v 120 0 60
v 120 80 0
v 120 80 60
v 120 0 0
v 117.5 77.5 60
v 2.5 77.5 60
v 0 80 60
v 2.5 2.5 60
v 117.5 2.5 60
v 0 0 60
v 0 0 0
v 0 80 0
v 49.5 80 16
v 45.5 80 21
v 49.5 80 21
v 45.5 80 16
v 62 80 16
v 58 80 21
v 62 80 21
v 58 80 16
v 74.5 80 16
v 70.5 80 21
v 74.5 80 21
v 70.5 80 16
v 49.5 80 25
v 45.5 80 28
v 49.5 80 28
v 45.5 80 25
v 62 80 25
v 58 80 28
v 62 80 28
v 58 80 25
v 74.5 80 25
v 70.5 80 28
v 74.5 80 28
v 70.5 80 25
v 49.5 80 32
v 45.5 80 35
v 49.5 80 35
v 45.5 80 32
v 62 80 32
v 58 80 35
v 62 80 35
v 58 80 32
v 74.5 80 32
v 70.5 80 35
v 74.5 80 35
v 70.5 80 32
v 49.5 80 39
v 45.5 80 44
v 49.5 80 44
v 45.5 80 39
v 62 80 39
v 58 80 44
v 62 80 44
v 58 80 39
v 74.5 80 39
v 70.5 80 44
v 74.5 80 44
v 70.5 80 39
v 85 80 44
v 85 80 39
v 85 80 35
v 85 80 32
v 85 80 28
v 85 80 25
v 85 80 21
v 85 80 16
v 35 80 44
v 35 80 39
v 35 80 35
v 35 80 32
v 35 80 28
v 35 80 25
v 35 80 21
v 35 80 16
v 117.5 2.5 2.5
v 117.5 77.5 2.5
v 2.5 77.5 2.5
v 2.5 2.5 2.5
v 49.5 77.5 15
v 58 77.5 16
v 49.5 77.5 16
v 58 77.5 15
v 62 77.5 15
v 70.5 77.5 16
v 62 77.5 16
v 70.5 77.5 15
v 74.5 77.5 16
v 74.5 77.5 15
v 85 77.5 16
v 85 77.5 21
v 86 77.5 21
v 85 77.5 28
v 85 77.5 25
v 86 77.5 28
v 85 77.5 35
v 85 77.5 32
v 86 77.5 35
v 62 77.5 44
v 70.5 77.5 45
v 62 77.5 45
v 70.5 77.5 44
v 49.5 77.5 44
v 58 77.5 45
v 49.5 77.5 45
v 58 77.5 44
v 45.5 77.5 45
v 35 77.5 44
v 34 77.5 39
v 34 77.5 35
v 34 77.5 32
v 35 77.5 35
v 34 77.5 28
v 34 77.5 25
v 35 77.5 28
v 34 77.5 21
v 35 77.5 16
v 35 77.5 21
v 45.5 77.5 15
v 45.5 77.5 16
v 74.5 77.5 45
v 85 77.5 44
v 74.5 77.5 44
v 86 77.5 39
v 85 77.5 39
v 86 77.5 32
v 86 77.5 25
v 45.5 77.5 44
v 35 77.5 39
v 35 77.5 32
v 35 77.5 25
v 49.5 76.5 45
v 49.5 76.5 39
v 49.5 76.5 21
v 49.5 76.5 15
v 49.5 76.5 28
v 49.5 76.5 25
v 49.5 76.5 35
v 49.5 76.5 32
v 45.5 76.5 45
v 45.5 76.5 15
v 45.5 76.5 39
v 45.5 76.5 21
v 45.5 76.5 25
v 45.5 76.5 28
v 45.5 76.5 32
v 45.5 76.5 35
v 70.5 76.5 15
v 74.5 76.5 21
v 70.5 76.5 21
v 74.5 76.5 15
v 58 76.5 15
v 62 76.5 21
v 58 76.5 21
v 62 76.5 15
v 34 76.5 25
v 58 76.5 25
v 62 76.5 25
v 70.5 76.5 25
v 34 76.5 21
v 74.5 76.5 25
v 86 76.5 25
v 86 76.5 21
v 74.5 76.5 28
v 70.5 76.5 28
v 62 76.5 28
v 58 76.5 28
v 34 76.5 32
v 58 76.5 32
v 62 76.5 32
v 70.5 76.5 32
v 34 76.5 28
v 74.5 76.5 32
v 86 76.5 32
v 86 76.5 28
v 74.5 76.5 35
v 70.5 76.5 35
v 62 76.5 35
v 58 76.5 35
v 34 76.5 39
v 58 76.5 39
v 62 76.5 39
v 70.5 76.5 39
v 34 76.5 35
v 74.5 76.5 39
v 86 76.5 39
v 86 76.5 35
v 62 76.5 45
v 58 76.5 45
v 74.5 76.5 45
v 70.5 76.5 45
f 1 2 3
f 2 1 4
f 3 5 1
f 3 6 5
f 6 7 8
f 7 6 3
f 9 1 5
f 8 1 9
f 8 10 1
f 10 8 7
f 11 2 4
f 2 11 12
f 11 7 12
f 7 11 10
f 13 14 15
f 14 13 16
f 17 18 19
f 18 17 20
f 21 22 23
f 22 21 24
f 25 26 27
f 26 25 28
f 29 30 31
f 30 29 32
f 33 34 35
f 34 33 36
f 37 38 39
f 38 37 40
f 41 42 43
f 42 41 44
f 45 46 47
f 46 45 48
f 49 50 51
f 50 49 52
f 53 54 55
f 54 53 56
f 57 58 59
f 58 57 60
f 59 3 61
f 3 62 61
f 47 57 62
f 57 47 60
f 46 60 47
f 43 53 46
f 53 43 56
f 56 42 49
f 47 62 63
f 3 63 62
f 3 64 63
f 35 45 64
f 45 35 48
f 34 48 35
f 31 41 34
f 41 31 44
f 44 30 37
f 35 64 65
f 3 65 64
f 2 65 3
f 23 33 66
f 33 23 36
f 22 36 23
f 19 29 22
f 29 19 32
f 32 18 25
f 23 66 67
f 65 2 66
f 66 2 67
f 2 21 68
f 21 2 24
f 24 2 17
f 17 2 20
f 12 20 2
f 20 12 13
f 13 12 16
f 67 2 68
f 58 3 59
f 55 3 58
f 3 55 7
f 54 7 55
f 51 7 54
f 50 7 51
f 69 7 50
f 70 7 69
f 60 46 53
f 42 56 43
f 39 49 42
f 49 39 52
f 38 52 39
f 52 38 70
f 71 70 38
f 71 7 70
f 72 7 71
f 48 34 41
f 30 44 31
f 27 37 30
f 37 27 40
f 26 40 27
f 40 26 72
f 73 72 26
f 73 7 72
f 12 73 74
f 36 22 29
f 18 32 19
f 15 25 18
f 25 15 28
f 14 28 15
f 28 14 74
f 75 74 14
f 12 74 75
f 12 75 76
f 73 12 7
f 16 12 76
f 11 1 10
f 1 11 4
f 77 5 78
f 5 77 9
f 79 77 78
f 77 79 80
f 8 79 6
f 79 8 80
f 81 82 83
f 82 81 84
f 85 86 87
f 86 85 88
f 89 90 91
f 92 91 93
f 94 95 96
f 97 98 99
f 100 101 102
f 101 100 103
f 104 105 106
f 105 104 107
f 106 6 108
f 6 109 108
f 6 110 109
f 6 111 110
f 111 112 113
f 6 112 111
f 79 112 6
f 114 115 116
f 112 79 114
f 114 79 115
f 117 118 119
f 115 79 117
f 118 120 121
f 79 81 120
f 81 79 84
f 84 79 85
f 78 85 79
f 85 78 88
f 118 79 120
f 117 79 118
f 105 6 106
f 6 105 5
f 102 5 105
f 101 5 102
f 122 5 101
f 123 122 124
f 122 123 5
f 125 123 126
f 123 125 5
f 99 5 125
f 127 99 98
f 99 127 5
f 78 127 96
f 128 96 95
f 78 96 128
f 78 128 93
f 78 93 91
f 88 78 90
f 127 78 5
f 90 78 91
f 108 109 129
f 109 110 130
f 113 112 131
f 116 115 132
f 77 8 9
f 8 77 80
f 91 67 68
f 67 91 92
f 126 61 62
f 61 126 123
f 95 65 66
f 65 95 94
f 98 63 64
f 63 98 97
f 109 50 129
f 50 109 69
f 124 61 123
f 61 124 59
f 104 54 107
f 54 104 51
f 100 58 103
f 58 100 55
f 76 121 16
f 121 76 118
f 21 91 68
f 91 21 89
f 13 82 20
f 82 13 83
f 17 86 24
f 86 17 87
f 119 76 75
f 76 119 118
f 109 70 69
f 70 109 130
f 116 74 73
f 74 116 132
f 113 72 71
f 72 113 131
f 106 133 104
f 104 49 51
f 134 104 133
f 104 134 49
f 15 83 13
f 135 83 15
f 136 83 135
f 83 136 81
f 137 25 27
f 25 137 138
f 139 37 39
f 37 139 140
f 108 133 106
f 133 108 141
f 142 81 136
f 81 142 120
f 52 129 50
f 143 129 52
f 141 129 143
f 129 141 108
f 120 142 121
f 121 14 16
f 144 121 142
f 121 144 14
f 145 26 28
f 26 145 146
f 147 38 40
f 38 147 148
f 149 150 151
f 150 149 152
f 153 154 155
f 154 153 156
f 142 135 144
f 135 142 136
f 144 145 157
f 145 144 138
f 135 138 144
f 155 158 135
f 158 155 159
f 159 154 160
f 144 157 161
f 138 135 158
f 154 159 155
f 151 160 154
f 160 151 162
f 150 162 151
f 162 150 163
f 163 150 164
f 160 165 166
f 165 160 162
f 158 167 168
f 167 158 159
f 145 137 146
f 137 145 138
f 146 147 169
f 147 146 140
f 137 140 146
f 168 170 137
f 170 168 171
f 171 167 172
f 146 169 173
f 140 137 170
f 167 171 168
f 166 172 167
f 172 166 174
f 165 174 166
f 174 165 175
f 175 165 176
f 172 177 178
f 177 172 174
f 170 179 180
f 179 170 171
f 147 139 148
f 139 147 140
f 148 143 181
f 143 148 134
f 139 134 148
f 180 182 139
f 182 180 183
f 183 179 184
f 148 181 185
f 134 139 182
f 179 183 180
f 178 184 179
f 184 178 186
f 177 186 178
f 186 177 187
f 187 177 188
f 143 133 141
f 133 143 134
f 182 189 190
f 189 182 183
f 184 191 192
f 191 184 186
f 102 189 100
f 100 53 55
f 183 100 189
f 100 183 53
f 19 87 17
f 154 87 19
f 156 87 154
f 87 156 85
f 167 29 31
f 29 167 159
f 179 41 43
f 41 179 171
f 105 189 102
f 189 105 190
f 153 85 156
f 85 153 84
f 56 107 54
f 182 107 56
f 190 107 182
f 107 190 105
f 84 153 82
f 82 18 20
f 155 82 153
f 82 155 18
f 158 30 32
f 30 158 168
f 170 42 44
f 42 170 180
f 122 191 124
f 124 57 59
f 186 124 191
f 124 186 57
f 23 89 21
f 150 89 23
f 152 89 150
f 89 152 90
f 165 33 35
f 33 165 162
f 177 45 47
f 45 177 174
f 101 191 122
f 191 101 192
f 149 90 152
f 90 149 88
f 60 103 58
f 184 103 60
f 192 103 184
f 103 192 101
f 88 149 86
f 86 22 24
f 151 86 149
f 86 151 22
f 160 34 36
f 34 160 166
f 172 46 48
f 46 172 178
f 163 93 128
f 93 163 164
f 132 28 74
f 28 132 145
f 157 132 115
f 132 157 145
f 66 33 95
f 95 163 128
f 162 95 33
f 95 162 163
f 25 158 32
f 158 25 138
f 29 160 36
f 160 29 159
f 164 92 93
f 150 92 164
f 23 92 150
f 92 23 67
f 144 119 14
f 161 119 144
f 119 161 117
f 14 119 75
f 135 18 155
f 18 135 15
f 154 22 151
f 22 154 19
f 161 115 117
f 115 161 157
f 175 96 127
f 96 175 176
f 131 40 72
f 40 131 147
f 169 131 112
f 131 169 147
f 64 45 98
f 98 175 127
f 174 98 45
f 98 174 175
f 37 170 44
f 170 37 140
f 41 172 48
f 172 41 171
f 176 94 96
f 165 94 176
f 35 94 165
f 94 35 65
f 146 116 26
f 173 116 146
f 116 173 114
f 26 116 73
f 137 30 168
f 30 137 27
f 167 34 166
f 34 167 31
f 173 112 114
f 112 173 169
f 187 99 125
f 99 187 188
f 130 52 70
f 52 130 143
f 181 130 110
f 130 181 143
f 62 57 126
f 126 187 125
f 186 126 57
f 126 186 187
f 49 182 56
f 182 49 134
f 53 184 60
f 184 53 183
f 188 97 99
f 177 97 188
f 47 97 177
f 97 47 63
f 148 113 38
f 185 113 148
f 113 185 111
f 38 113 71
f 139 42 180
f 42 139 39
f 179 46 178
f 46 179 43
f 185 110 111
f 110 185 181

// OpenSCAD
$fn = 32;

// ----------------------------------------------------------------------
// Vent box: crossgrid enclosure
// ----------------------------------------------------------------------

// --- parameters (mm) ---
box_l = 120;              // box length, X
box_w = 80;               // box width, Y
box_h = 60;               // box height, Z
wall_t = 2.5;             // shell wall thickness
win_l = 50;               // vent window width, X
win_h = 28;               // vent window height, Z
bar_w = 4;                // grid bar width
n_v = 3;                  // vertical bar count
n_h = 3;                  // horizontal bar count
fit_tol = 0.1;            // tolerance for press fits, mm
free_tol = 0.5;           // tolerance for clearance fits, mm

win_z0 = (box_h - win_h) / 2;  // window lower edge Z
v_step = win_l / (n_v + 1);  // vertical bar step
h_step = win_h / (n_h + 1);  // horizontal bar step

difference() {
  union() {
    difference() {
      cube([box_l, box_w, box_h]);
  translate([wall_t, wall_t, wall_t])
    cube([box_l - 2 * wall_t, box_w - 2 * wall_t, box_h]);
  translate([(box_l - win_l) / 2, box_w - wall_t - 1, win_z0])
    cube([win_l, wall_t + 2, win_h]);
    }
    for (i = [1 : n_v])
      translate([(box_l - win_l) / 2 + i * v_step - bar_w / 2,
                 box_w - wall_t - 1, win_z0 - 1])
        cube([bar_w, wall_t + 1, win_h + 2]);
    for (i = [1 : n_h])
      translate([(box_l - win_l) / 2 - 1, box_w - wall_t - 1,
                 win_z0 + i * h_step - bar_w / 2])
        cube([win_l + 2, wall_t + 1, bar_w]);
  }
}
